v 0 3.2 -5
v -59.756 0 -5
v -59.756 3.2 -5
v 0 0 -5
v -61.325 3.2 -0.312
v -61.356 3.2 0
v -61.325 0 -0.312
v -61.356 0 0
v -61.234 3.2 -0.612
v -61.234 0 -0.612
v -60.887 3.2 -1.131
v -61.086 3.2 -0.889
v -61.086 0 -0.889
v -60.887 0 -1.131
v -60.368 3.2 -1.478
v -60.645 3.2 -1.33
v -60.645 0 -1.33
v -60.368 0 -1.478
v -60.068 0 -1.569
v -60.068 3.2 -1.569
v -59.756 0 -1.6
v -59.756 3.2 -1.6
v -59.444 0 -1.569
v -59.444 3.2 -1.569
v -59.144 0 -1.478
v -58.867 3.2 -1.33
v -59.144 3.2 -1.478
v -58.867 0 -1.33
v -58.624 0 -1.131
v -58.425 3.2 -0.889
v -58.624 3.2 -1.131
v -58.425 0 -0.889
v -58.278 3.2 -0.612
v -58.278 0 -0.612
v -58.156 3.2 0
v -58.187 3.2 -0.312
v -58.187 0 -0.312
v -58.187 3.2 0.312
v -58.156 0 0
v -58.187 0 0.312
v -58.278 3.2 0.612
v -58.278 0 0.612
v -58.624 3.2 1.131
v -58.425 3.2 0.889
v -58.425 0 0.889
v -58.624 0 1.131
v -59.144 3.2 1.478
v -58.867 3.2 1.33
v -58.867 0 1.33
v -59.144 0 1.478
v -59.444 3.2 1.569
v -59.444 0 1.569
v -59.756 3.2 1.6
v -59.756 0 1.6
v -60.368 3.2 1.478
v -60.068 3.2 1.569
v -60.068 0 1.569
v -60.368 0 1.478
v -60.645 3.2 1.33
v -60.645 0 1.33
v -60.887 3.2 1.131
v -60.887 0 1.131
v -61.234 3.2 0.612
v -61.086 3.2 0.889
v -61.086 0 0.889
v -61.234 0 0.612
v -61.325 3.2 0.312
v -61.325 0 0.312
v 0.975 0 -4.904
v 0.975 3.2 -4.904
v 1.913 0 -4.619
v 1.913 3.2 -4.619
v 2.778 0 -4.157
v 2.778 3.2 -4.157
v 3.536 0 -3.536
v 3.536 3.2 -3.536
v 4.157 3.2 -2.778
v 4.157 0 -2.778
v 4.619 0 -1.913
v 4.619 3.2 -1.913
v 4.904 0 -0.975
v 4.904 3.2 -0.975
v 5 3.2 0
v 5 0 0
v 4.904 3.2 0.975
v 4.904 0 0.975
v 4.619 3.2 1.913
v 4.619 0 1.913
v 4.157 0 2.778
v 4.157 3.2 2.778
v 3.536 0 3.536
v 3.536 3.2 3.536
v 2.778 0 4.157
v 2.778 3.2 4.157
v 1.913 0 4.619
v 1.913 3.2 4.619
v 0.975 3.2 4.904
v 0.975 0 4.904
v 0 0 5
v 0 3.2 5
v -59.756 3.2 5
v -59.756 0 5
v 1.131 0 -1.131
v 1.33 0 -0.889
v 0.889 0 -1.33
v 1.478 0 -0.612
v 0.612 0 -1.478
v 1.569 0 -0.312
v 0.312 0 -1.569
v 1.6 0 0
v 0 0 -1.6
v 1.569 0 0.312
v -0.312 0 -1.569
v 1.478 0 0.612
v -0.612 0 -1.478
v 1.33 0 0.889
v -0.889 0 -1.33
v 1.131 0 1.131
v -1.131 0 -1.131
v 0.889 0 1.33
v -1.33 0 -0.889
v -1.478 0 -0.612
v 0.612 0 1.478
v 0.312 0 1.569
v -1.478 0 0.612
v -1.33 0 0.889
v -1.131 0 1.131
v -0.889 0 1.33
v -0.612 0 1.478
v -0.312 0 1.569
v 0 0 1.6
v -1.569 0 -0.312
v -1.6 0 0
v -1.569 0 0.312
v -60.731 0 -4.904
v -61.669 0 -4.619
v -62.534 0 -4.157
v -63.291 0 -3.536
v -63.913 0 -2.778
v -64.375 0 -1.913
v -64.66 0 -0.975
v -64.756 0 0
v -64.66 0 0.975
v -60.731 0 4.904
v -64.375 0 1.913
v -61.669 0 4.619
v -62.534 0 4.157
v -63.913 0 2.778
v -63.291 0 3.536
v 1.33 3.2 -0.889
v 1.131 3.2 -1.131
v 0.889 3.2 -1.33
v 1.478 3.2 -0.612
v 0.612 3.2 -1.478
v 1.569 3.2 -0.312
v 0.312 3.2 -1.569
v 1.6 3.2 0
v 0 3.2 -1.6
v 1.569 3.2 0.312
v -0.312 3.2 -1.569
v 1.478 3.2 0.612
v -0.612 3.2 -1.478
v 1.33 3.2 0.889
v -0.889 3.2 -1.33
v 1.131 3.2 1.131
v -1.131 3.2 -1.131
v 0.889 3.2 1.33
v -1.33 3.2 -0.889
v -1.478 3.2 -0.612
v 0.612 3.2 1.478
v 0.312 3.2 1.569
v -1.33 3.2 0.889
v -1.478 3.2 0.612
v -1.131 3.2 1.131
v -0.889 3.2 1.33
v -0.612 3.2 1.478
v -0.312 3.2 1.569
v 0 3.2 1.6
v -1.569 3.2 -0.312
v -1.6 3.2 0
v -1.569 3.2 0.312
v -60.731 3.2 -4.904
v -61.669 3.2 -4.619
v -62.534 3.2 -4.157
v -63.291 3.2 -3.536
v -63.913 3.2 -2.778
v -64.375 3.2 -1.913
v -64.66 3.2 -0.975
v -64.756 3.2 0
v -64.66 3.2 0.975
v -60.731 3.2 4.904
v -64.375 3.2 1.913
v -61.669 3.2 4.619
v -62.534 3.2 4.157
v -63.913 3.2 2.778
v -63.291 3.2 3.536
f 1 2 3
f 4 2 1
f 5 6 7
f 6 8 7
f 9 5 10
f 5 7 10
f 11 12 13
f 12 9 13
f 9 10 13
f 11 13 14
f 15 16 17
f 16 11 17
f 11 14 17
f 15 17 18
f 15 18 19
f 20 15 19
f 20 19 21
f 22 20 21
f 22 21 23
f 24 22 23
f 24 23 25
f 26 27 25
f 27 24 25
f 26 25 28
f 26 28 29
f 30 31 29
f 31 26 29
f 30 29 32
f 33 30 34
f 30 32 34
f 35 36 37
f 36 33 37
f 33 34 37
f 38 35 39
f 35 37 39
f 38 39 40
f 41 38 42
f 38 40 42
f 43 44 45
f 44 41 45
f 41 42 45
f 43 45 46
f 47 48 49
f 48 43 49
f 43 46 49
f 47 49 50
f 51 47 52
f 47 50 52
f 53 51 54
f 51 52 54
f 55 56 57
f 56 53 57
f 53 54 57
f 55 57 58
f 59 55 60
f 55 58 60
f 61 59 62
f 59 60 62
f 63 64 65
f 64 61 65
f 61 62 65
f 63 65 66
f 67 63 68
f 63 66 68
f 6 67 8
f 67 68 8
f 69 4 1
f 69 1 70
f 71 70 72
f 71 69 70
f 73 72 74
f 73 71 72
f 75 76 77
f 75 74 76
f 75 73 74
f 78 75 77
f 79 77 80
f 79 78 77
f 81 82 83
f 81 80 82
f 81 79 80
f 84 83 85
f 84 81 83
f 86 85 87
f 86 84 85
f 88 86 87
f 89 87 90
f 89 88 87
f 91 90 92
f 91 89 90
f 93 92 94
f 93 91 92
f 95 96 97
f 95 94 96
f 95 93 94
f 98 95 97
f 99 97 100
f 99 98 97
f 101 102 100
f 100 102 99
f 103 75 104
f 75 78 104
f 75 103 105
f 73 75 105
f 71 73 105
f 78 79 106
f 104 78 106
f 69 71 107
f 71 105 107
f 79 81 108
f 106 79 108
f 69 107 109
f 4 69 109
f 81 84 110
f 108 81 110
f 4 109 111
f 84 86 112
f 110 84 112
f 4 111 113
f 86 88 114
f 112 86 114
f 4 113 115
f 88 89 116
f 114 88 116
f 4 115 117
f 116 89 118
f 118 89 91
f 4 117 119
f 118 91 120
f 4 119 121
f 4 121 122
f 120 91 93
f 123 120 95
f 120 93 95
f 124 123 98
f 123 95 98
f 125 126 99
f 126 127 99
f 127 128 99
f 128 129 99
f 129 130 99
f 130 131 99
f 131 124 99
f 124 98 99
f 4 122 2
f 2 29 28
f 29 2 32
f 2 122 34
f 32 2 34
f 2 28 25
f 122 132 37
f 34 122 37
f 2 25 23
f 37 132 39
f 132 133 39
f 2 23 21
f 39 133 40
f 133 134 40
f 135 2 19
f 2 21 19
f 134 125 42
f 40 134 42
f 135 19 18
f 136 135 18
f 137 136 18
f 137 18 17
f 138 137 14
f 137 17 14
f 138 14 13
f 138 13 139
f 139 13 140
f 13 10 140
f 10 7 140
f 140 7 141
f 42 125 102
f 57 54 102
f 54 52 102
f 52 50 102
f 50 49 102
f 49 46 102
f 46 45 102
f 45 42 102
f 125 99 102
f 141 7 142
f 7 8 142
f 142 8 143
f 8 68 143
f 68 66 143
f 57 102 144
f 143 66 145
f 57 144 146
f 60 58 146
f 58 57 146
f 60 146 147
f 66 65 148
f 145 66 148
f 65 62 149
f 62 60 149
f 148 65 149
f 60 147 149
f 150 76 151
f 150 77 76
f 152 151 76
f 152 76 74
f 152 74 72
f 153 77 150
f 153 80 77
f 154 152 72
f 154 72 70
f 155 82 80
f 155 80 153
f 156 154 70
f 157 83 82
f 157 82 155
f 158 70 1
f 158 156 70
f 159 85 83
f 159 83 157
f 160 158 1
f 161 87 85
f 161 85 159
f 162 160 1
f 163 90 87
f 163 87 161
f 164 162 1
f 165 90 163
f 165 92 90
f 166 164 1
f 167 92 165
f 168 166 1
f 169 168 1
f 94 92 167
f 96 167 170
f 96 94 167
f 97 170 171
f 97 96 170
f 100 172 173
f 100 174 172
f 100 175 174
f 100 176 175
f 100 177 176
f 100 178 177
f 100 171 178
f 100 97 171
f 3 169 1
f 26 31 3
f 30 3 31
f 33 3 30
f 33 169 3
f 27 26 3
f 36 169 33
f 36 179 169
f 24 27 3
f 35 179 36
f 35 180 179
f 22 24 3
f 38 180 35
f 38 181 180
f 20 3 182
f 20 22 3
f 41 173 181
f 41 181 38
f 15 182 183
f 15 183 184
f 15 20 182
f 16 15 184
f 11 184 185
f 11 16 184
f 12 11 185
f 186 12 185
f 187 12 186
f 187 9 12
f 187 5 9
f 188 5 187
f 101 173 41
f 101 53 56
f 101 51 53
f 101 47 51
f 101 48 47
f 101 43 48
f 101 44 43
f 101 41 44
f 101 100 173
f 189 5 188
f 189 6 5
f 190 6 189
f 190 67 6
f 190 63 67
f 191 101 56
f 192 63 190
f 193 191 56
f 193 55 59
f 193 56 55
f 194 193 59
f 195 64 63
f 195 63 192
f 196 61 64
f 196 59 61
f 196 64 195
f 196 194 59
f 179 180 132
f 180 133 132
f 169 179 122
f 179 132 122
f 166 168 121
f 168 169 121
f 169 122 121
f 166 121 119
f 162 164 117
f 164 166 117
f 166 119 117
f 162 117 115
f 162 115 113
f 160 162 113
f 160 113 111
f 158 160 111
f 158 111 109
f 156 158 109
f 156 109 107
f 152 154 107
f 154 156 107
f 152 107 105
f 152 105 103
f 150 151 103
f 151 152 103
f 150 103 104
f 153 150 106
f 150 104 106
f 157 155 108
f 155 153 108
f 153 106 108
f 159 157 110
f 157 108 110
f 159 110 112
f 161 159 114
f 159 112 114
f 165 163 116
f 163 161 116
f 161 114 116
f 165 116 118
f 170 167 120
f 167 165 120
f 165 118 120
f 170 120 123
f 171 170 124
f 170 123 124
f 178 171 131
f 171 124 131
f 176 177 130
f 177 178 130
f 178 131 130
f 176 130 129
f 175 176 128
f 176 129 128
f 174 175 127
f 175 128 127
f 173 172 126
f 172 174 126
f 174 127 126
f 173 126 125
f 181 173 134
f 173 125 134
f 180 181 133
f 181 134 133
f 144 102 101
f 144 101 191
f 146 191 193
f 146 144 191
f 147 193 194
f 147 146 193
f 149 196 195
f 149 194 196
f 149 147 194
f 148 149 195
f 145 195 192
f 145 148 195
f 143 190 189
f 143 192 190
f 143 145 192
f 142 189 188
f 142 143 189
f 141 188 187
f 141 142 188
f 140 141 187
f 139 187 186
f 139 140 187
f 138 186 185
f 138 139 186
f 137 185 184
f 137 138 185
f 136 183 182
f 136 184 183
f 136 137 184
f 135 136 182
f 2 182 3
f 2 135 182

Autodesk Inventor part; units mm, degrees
ref_plane "YZ Plane" through (0, 0, 0) normal (1, 0, 0) x (0, 1, 0)
ref_plane "XZ Plane" through (0, 0, 0) normal (0, 1, 0) x (-1, 0, 0)
ref_plane "XY Plane" through (0, 0, 0) normal (0, 0, 1) x (1, 0, 0)
sketch "Sketch1" plane through (0, 0, 0) normal (0, 1, 0) x (-1, 0, 0)
  circle A0 centre (59.7558, 0) radius 1.6
  circle A1 centre (0, 0) radius 1.6
  arc A2 (59.7558, -5) -> (59.7558, 5) centre (59.7558, 0) ccw
  arc A3 (0, 5) -> (0, -5) centre (0, 0) ccw
  line L0 (59.7558, 5) -> (0, 5)
  line L1 (59.7558, -5) -> (0, -5)
  dimension "d0" = 3.2
  dimension "d1" = 3.2
  dimension "d2" = 59.7557
  dimension "d12" = 10
  dimension "d13" = 10
extrude "Extrusion1" add sketch "Sketch1" along normal blind 3.2
equation "\"d13\" = d12"
properties part number "portabateria"
